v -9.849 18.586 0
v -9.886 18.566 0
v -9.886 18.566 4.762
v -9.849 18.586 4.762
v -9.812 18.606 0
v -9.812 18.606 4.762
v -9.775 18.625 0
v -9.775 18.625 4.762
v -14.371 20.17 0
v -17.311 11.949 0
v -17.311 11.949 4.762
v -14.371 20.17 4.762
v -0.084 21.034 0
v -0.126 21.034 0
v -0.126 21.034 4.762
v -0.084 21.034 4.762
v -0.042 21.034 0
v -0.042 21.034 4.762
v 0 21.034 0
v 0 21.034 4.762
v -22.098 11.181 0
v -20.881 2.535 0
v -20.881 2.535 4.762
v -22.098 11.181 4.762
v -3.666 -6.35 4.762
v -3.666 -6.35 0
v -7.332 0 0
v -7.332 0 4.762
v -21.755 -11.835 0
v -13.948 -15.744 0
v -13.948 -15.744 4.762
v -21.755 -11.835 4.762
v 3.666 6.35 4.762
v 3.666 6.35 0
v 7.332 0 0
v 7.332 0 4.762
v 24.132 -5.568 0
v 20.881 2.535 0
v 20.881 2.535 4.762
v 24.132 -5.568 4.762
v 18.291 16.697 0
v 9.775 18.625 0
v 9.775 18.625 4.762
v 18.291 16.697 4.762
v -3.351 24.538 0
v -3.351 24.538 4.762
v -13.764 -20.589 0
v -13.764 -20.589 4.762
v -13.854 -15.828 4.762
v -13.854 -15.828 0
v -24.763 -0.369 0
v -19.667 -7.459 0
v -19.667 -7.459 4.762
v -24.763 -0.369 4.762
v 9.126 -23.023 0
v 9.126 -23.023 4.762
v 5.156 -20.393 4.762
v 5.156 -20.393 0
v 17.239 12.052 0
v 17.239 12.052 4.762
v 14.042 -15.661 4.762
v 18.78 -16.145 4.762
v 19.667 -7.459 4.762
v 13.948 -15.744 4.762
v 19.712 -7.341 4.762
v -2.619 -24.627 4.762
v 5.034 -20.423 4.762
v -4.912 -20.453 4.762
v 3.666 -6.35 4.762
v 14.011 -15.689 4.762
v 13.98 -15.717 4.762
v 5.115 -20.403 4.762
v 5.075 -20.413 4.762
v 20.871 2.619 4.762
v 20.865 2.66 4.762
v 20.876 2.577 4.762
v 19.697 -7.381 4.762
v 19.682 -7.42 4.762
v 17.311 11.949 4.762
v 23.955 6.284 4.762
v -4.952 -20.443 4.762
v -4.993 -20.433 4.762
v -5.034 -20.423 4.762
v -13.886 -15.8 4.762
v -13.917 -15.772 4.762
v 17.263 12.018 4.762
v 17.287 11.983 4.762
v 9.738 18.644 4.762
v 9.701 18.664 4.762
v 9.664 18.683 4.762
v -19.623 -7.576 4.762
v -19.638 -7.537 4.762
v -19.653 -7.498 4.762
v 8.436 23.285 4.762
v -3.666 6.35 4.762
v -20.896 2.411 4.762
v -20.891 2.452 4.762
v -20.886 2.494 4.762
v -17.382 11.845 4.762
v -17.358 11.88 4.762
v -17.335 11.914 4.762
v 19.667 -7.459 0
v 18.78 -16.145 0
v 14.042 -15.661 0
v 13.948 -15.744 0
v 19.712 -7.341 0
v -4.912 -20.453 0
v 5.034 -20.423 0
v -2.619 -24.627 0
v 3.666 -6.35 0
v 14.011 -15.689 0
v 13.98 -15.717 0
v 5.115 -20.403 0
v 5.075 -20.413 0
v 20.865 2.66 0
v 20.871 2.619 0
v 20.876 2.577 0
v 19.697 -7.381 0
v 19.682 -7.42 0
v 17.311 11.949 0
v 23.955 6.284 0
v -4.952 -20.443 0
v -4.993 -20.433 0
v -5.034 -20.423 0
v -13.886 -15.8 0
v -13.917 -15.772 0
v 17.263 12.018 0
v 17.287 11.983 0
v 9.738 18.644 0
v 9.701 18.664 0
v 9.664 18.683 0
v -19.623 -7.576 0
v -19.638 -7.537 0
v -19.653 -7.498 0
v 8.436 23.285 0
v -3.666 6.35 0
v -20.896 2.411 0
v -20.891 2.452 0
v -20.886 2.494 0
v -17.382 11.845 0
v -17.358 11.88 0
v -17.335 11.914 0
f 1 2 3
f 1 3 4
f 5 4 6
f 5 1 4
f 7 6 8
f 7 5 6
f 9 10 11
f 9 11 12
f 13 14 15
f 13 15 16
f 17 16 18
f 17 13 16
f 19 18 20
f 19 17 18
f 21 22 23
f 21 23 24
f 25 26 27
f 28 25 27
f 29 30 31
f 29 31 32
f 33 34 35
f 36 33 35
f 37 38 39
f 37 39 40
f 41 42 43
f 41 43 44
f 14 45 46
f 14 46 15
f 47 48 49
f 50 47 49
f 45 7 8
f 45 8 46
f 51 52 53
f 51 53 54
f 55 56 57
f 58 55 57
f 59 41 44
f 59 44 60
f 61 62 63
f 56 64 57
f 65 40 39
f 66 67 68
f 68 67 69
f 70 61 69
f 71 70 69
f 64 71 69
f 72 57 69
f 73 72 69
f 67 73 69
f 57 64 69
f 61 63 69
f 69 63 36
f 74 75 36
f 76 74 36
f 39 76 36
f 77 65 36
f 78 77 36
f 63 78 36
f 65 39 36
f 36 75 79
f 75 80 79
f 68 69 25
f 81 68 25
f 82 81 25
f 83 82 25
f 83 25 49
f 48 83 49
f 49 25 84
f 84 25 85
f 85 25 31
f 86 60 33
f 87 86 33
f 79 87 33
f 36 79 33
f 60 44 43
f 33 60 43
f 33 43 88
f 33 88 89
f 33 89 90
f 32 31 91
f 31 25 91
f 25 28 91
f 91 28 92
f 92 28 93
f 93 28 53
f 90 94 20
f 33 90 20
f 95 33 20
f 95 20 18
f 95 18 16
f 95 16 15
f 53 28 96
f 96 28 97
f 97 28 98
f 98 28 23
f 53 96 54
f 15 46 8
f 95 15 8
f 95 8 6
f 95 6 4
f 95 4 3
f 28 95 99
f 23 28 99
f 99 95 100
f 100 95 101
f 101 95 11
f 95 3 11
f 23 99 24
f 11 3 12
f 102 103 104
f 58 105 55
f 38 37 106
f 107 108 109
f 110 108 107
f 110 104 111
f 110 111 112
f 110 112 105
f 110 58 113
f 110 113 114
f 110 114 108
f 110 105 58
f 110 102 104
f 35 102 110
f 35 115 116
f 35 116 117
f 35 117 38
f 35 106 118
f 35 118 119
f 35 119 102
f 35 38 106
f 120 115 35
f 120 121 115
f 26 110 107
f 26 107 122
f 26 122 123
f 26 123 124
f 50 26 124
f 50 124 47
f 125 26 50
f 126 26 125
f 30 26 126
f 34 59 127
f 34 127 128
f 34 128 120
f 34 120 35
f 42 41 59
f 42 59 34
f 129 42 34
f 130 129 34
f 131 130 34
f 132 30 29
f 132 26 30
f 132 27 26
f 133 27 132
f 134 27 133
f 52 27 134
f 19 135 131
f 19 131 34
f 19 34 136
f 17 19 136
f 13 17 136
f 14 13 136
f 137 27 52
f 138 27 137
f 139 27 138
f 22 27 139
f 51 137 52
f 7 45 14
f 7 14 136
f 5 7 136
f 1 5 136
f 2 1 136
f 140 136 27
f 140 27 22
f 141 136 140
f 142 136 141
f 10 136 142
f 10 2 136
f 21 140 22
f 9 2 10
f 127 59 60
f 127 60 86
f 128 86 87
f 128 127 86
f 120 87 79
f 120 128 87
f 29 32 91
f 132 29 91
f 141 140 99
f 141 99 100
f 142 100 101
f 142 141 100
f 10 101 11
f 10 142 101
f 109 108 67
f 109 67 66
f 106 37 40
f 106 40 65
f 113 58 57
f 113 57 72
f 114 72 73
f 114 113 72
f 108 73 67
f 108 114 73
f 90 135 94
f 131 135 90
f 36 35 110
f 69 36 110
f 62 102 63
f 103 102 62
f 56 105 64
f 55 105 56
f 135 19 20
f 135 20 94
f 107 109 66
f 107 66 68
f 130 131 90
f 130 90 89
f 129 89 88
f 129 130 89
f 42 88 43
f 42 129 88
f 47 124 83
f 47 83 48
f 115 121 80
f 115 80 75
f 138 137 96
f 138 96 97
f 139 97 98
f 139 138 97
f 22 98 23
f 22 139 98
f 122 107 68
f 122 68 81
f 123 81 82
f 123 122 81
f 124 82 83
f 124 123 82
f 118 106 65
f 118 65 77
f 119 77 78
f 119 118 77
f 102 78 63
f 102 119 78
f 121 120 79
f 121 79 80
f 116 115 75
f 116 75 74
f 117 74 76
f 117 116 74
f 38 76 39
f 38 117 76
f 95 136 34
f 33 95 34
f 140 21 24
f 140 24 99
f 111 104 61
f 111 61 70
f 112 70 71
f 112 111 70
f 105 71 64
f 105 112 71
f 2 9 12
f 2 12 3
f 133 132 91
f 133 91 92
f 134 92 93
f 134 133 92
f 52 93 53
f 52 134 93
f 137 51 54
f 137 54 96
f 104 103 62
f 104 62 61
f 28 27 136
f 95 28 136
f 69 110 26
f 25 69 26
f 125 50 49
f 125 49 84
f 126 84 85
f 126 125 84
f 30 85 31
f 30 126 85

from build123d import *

# Parameters (mm, degrees)
BOSS_EXTRUDE1_DEPTH = 4.7625
CUT_EXTRUDE1_DEPTH  = 4.7625


with BuildPart() as part:
    # Sketch1 → Boss-Extrude1 (new body)
    with BuildSketch(Plane.XY):
        with BuildLine():
            Line((0, 21.034375), (8.436280557, 23.284685407))
            Line((8.436280557, 23.284685407), (9.663722597, 18.68307783))
            ThreePointArc((9.663722597, 18.68307783), (9.719485393, 18.654129176), (9.775161472, 18.62501409))
            Line((9.775161472, 18.62501409), (18.290888316, 16.697029938))
            Line((18.290888316, 16.697029938), (17.239260597, 12.052088023))
            ThreePointArc((17.239260597, 12.052088023), (17.27518299, 12.000541), (17.310951254, 11.948886907))
            Line((17.310951254, 11.948886907), (23.95527399, 6.284286132))
            Line((23.95527399, 6.284286132), (20.865491749, 2.660110094))
            ThreePointArc((20.865491749, 2.660110094), (20.873344353, 2.597773503), (20.881010724, 2.535413734))
            Line((20.881010724, 2.535413734), (24.131795086, -5.568111894))
            Line((24.131795086, -5.568111894), (19.711690198, -7.341267))
            ThreePointArc((19.711690198, -7.341267), (19.689674075, -7.400112598), (19.66748228, -7.458892171))
            Line((19.66748228, -7.458892171), (18.780012747, -16.144922587))
            Line((18.780012747, -16.144922587), (14.042177975, -15.660848297))
            ThreePointArc((14.042177975, -15.660848297), (13.995336753, -15.702722083), (13.948370664, -15.744455769))
            Line((13.948370664, -15.744455769), (9.125955812, -23.023126083))
            Line((9.125955812, -23.023126083), (5.155772004, -20.392717982))
            ThreePointArc((5.155772004, -20.392717982), (5.094836443, -20.408027177), (5.033855426, -20.423154291))
            Line((5.033855426, -20.423154291), (-2.61874762, -24.627008853))
            Line((-2.61874762, -24.627008853), (-4.9117592, -20.452861736))
            ThreePointArc((-4.9117592, -20.452861736), (-4.972829497, -20.438099188), (-5.033855426, -20.423154291))
            Line((-5.033855426, -20.423154291), (-13.763527532, -20.589140681))
            Line((-13.763527532, -20.589140681), (-13.854065563, -15.827501351))
            ThreePointArc((-13.854065563, -15.827501351), (-13.901280128, -15.786048982), (-13.948370664, -15.744455769))
            Line((-13.948370664, -15.744455769), (-21.755249155, -11.834548506))
            Line((-21.755249155, -11.834548506), (-19.622572466, -7.576251148))
            ThreePointArc((-19.622572466, -7.576251148), (-19.64511501, -7.517605196), (-19.66748228, -7.458892171))
            Line((-19.66748228, -7.458892171), (-24.763105375, -0.36880389))
            Line((-24.763105375, -0.36880389), (-20.895784495, 2.410626889))
            ThreePointArc((-20.895784495, 2.410626889), (-20.888490793, 2.473031344), (-20.881010724, 2.535413734))
            Line((-20.881010724, 2.535413734), (-22.098032582, 11.181429253))
            Line((-22.098032582, 11.181429253), (-17.382024117, 11.845259357))
            ThreePointArc((-17.382024117, 11.845259357), (-17.346565069, 11.897126206), (-17.310951254, 11.948886907))
            Line((-17.310951254, 11.948886907), (-14.370566834, 20.170131705))
            Line((-14.370566834, 20.170131705), (-9.88625149, 18.566285658))
            ThreePointArc((-9.88625149, 18.566285658), (-9.830750336, 18.59573283), (-9.775161472, 18.62501409))
            Line((-9.775161472, 18.62501409), (-3.350977409, 24.53810006))
            Line((-3.350977409, 24.53810006), (-0.125657789, 21.033999662))
            ThreePointArc((-0.125657789, 21.033999662), (-0.062829175, 21.034281165), (0, 21.034375))
        make_face()
    extrude(amount=BOSS_EXTRUDE1_DEPTH)

    # Sketch2 → Cut-Extrude1 (cut)
    with BuildSketch(Plane(origin=(0, 0, 0), x_dir=(-1, 0, 0), z_dir=(0, 0, -1))):
        Polygon((-7.332348419, 0), (-3.666174209, -6.35), (3.666174209, -6.35), (7.332348419, 0), (3.666174209, 6.35), (-3.666174209, 6.35), align=None)
    extrude(amount=-CUT_EXTRUDE1_DEPTH, mode=Mode.SUBTRACT)


solid = part.part
